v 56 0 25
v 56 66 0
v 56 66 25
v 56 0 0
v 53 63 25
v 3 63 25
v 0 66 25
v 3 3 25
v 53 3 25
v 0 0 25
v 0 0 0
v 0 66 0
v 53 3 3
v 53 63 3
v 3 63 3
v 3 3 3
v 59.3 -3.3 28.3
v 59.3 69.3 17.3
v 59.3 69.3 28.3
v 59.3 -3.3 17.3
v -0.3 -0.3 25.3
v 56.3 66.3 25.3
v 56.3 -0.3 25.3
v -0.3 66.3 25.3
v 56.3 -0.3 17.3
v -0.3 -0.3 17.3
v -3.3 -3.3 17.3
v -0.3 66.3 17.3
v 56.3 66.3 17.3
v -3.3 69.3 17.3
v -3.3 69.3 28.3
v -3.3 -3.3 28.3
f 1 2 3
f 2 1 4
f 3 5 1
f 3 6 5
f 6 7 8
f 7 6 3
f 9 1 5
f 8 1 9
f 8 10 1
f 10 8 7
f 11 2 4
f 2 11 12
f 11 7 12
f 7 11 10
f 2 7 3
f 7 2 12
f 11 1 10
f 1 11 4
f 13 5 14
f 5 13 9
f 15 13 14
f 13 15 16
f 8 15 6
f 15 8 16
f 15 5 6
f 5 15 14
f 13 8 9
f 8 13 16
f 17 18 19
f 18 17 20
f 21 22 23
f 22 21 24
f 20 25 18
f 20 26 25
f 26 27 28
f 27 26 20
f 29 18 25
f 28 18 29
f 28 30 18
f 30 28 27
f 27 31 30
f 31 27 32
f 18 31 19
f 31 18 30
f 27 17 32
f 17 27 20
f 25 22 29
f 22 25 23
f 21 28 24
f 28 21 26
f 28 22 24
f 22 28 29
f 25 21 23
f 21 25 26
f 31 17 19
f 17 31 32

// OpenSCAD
$fn = 48;

wall = 3.0;
clearance = 0.30;

cavity_x = 50;
cavity_y = 60;
cavity_z = 22;

base_outer_x = cavity_x + 2 * wall;
base_outer_y = cavity_y + 2 * wall;
base_outer_z = wall + cavity_z;

lid_top_thickness = 3.0;
lid_skirt_thickness = 3.0;
lid_skirt_depth = 8.0;

lid_inner_x = base_outer_x + 2 * clearance;
lid_inner_y = base_outer_y + 2 * clearance;
lid_outer_x = lid_inner_x + 2 * lid_skirt_thickness;
lid_outer_y = lid_inner_y + 2 * lid_skirt_thickness;

module base() {
    difference() {
        cube([base_outer_x, base_outer_y, base_outer_z], center = false);

        translate([wall, wall, wall])
            cube([cavity_x, cavity_y, cavity_z + 0.2], center = false);
    }
}

module lid() {
    translate([
        -(lid_outer_x - base_outer_x) / 2,
        -(lid_outer_y - base_outer_y) / 2,
        base_outer_z + clearance
    ])
    union() {
        cube([lid_outer_x, lid_outer_y, lid_top_thickness], center = false);

        difference() {
            translate([0, 0, -lid_skirt_depth])
                cube([lid_outer_x, lid_outer_y, lid_skirt_depth], center = false);

            translate([lid_skirt_thickness, lid_skirt_thickness, -lid_skirt_depth - 0.1])
                cube([lid_inner_x, lid_inner_y, lid_skirt_depth + 0.2], center = false);
        }
    }
}

base();
lid();
